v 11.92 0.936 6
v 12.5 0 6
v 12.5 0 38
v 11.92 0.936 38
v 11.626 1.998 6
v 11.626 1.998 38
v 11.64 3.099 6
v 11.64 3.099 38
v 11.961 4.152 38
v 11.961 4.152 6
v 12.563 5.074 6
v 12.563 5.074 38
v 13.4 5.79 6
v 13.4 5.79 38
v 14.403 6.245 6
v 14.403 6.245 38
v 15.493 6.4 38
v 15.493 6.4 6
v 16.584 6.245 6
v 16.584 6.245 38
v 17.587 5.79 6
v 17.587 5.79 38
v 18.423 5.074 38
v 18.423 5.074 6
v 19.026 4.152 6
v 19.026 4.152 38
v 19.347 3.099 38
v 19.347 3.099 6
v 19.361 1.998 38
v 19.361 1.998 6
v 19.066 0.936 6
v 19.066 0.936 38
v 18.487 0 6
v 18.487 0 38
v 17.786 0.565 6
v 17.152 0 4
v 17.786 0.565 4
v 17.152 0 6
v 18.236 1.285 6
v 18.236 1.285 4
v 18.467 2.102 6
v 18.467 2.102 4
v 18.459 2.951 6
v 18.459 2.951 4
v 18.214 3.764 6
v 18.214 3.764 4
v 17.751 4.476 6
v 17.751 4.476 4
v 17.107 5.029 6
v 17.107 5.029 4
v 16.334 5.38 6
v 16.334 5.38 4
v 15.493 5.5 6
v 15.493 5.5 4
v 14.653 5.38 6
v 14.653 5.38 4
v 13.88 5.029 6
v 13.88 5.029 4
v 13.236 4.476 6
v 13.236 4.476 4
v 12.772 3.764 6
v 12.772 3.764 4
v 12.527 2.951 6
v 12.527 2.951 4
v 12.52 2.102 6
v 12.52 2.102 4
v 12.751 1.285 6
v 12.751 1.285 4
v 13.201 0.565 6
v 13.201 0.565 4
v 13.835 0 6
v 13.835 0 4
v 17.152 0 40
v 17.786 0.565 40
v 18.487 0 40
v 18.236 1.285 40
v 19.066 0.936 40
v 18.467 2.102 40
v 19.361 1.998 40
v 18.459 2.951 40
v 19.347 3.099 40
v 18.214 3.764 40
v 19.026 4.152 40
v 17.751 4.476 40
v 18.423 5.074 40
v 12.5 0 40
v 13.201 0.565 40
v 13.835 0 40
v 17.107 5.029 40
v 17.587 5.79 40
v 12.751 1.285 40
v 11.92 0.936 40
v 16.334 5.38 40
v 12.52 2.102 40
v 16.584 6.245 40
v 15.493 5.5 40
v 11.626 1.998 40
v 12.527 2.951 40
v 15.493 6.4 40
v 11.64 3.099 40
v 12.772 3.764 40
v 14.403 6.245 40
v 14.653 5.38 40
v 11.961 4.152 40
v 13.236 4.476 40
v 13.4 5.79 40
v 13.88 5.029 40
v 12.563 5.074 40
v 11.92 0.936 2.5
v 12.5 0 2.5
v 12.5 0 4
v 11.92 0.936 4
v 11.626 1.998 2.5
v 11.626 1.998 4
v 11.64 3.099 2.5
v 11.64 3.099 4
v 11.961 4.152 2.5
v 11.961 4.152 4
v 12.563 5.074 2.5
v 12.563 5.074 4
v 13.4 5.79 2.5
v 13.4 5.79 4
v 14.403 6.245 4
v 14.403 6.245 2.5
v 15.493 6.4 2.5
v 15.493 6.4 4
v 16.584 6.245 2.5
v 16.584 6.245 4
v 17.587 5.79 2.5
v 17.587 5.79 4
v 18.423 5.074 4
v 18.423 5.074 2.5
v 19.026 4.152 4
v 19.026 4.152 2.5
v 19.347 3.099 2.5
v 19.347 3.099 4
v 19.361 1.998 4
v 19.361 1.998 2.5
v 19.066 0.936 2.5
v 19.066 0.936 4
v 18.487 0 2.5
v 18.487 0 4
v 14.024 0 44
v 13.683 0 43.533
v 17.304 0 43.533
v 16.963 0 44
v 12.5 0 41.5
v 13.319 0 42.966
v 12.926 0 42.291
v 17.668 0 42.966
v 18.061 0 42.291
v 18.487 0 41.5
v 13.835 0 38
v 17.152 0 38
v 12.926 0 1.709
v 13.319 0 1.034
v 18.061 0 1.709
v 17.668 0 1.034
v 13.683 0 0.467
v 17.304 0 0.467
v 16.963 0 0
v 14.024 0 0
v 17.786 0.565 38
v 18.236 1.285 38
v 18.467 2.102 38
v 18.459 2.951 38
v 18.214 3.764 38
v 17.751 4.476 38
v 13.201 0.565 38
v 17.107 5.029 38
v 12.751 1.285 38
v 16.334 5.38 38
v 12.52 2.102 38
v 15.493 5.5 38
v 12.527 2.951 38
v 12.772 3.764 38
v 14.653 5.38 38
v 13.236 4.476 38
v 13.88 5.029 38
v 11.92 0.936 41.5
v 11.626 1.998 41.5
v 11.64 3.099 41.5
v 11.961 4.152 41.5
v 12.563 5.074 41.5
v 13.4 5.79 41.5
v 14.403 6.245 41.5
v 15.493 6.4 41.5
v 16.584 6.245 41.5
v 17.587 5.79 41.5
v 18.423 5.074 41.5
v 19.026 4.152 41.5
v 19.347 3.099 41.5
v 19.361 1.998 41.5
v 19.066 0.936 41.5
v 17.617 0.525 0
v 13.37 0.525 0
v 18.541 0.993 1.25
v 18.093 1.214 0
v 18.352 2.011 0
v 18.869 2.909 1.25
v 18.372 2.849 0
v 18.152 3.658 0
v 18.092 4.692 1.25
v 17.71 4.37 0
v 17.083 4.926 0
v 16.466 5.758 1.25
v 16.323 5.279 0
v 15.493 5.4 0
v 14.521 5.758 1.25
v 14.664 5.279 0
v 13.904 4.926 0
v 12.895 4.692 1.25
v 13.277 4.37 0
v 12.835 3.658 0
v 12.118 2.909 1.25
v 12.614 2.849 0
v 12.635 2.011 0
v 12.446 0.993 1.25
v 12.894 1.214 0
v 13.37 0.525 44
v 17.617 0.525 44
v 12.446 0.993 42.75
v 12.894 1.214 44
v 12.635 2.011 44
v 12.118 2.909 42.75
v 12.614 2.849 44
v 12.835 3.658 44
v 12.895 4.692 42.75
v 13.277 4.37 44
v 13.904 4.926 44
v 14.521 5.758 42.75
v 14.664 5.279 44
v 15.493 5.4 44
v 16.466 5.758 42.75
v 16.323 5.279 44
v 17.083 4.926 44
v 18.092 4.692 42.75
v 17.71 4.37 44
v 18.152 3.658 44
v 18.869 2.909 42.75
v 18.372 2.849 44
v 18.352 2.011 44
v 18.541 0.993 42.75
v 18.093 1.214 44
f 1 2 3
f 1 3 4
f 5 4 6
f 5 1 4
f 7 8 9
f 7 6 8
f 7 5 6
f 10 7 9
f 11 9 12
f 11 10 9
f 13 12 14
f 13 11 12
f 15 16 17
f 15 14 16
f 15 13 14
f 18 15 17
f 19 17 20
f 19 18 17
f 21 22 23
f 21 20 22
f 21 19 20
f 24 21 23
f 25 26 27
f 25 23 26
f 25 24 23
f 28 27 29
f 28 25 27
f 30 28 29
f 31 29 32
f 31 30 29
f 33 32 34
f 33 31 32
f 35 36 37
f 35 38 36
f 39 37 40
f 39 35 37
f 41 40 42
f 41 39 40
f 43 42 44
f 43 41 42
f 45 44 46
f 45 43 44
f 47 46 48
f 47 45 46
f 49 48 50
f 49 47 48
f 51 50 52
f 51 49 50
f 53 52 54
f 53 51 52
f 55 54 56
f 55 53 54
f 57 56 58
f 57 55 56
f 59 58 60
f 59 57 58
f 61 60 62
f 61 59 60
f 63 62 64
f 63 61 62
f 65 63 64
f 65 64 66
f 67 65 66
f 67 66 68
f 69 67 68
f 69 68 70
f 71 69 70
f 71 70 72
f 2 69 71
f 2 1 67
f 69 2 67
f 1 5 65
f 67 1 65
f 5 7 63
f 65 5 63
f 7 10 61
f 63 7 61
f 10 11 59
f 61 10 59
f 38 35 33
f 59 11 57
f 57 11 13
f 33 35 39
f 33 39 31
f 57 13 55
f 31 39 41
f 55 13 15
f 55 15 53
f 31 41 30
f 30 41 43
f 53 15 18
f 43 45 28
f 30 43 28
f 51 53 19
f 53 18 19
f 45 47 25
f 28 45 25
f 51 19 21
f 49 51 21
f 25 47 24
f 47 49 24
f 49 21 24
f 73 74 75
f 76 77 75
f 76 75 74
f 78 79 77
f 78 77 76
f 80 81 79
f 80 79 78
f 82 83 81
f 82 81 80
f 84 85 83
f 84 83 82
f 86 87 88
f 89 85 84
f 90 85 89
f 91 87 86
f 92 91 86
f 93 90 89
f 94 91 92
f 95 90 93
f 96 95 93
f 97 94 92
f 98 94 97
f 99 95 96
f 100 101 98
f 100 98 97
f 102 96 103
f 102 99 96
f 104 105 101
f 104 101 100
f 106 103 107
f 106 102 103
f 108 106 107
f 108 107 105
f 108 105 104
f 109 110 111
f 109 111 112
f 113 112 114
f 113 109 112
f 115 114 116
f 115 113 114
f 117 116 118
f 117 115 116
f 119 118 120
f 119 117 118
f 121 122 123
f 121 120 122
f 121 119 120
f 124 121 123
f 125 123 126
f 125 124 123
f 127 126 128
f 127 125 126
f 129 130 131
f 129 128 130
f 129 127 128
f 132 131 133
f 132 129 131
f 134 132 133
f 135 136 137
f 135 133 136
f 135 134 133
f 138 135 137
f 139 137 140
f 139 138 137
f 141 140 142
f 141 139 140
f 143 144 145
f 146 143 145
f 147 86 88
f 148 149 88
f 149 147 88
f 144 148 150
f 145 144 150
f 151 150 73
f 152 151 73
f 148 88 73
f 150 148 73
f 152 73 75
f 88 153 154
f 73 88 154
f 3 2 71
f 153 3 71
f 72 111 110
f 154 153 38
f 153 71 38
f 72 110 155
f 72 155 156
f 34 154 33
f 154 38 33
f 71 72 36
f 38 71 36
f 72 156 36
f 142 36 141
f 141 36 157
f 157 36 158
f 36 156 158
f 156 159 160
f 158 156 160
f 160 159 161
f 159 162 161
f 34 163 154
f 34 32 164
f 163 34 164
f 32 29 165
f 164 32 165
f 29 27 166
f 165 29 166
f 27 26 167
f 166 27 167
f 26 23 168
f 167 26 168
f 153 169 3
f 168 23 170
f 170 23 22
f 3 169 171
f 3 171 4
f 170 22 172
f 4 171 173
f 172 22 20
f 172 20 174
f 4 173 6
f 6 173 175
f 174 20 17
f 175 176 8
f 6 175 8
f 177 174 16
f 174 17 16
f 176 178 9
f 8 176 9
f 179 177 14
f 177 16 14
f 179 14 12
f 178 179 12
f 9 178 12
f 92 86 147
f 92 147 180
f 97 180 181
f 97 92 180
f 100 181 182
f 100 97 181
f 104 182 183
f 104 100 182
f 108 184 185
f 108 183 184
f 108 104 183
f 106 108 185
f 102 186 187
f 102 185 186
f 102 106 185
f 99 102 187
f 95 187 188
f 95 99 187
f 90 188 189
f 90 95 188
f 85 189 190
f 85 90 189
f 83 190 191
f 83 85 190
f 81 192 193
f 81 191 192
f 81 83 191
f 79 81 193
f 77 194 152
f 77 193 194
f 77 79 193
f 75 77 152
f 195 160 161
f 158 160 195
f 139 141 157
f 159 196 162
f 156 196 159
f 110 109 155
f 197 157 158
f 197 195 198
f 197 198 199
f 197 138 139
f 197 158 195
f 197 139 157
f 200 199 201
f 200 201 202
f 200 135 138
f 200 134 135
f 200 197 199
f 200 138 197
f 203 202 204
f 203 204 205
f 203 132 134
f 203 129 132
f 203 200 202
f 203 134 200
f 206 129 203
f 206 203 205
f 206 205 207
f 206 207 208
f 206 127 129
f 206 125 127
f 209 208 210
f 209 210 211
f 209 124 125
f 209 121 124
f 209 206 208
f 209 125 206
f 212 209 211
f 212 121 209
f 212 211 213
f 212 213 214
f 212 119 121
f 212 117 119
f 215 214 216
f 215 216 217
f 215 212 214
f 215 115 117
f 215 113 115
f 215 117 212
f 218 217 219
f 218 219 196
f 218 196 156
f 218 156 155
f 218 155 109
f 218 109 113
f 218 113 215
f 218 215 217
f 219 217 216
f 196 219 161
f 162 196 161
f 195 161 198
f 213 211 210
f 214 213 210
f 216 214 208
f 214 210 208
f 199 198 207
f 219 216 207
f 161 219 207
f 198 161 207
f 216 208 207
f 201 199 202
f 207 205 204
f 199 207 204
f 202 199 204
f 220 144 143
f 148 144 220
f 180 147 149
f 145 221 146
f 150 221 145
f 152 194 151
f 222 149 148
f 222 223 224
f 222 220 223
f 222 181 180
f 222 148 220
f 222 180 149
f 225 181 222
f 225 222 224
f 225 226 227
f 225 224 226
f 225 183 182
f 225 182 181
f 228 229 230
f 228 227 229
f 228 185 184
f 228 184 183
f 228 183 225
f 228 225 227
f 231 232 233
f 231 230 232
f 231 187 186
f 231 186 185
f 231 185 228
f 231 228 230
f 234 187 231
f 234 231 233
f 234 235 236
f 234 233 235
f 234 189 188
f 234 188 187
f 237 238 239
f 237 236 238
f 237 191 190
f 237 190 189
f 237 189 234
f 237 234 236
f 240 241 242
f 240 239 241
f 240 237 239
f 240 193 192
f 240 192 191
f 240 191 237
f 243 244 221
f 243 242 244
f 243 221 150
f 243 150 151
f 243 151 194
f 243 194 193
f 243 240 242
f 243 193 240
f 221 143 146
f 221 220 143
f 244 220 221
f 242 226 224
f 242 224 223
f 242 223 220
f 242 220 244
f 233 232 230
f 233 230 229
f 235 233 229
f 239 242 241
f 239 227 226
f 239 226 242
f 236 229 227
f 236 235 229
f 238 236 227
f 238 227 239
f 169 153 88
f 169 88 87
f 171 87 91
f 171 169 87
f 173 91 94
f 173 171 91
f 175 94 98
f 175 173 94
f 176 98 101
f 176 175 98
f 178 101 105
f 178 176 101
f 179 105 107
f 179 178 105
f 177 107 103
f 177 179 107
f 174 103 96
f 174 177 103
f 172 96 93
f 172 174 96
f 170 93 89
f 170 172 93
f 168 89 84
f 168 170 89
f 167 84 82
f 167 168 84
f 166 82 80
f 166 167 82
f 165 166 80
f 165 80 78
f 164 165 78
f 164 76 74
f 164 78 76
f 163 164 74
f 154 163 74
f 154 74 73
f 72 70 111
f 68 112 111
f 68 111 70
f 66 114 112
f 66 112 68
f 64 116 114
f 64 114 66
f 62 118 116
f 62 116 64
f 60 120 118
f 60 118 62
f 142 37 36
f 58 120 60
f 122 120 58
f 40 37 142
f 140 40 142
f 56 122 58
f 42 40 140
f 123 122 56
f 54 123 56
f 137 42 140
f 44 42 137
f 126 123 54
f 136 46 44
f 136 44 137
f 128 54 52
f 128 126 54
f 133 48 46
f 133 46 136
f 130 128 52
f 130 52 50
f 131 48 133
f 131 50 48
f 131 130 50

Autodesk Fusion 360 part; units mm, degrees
sketch "Sketch1" plane through (0, 0, 0) normal (0, 0, 1) x (1, 0, 0)
  line L0 (0, 0) -> (5.9867, 0)
  arc A0 (5.9867, 0) -> (0, 0) centre (2.9933, 2.5) ccw
  arc A1 (4.6516, 0) -> (1.335, 0) centre (2.9933, 2.5) ccw
  arc A2 (17.1516, 0) -> (13.835, 0) centre (15.4933, 2.5) ccw
  line L1 (12.5, 0) -> (18.4867, 0)
  arc A3 (18.4867, 0) -> (12.5, 0) centre (15.4933, 2.5) ccw
  arc A4 (29.6516, 0) -> (26.335, 0) centre (27.9933, 2.5) ccw
  line L2 (25, 0) -> (30.9867, 0)
  arc A5 (30.9867, 0) -> (25, 0) centre (27.9933, 2.5) ccw
  point P0 (12.5, 0)
  point P1 (25, 0)
  dimension "d1" = 3.9
  dimension "d2" = 2.5
  dimension "d13" = 6
  dimension "d16" = 25
  dimension "d17" = 0
extrude "Extrude1" add sketch "Sketch1" along normal blind 102 contours L0 A0 A1 | L0 A1 makes body 1
extrude "Extrude2" cut sketch "Sketch1" against normal blind 2 from surface at 6 contours L0 A0 A1 bodies 1
ref_plane "WorkPlane1" through (2.9933, 3.9289, 51) normal (0, 0, 1) x (1, 0, 0)
mirror "Mirror1" about plane through (2.9933, 3.9289, 51) normal (0, 0, 1) of "Extrude2"
extrude "Extrude3" add sketch "Sketch1" along normal blind 44 separate body contours A2 L1 | A2 L1 A3 makes body 2
extrude "Extrude4" cut sketch "Sketch1" against normal blind 2 from surface at 6 contours A2 L1 A3 bodies 2
ref_plane "WorkPlane2" through (15.4933, 3.9289, 22) normal (0, 0, 1) x (1, 0, 0)
mirror "Mirror2" about plane through (15.4933, 3.9289, 22) normal (0, 0, 1) of "Extrude4"
chamfer "Chamfer3" distance 2.5 distance2 1 1 edges at (15.4933, 6.4, 0) measured on face at (12.3817, 0.1488, 2.6667) on bodies 1 2
chamfer "Chamfer3" distance 2.5 distance2 1 1 edges at (2.9933, 6.4, 0) measured on face at (-0.1183, 0.1488, 2.6667) on bodies 1 2
chamfer "Chamfer3" distance 1 distance2 2.5 2 edges at (15.4933, 6.4, 44) (2.9933, 6.4, 102) measured on face at (16.772, 1.0681, 44) measured on face at (3.5688, 2.2017, 102) on bodies 1 2
hidden bodies 1
equation "d7 = Long_Pin + End_Thickness * 2"
equation "C_Clip_Thickness = 2 mm"
equation "End_Thickness = 4 mm + C_Clip_Thickness"
equation "Long_Pin = 90 mm"
equation "Short_Pin = 32 mm"
equation "d18 = End_Thickness"
equation "d19 = -C_Clip_Thickness"
equation "d25 = Short_Pin + End_Thickness * 2"
equation "d27 = End_Thickness"
equation "d28 = -C_Clip_Thickness"
